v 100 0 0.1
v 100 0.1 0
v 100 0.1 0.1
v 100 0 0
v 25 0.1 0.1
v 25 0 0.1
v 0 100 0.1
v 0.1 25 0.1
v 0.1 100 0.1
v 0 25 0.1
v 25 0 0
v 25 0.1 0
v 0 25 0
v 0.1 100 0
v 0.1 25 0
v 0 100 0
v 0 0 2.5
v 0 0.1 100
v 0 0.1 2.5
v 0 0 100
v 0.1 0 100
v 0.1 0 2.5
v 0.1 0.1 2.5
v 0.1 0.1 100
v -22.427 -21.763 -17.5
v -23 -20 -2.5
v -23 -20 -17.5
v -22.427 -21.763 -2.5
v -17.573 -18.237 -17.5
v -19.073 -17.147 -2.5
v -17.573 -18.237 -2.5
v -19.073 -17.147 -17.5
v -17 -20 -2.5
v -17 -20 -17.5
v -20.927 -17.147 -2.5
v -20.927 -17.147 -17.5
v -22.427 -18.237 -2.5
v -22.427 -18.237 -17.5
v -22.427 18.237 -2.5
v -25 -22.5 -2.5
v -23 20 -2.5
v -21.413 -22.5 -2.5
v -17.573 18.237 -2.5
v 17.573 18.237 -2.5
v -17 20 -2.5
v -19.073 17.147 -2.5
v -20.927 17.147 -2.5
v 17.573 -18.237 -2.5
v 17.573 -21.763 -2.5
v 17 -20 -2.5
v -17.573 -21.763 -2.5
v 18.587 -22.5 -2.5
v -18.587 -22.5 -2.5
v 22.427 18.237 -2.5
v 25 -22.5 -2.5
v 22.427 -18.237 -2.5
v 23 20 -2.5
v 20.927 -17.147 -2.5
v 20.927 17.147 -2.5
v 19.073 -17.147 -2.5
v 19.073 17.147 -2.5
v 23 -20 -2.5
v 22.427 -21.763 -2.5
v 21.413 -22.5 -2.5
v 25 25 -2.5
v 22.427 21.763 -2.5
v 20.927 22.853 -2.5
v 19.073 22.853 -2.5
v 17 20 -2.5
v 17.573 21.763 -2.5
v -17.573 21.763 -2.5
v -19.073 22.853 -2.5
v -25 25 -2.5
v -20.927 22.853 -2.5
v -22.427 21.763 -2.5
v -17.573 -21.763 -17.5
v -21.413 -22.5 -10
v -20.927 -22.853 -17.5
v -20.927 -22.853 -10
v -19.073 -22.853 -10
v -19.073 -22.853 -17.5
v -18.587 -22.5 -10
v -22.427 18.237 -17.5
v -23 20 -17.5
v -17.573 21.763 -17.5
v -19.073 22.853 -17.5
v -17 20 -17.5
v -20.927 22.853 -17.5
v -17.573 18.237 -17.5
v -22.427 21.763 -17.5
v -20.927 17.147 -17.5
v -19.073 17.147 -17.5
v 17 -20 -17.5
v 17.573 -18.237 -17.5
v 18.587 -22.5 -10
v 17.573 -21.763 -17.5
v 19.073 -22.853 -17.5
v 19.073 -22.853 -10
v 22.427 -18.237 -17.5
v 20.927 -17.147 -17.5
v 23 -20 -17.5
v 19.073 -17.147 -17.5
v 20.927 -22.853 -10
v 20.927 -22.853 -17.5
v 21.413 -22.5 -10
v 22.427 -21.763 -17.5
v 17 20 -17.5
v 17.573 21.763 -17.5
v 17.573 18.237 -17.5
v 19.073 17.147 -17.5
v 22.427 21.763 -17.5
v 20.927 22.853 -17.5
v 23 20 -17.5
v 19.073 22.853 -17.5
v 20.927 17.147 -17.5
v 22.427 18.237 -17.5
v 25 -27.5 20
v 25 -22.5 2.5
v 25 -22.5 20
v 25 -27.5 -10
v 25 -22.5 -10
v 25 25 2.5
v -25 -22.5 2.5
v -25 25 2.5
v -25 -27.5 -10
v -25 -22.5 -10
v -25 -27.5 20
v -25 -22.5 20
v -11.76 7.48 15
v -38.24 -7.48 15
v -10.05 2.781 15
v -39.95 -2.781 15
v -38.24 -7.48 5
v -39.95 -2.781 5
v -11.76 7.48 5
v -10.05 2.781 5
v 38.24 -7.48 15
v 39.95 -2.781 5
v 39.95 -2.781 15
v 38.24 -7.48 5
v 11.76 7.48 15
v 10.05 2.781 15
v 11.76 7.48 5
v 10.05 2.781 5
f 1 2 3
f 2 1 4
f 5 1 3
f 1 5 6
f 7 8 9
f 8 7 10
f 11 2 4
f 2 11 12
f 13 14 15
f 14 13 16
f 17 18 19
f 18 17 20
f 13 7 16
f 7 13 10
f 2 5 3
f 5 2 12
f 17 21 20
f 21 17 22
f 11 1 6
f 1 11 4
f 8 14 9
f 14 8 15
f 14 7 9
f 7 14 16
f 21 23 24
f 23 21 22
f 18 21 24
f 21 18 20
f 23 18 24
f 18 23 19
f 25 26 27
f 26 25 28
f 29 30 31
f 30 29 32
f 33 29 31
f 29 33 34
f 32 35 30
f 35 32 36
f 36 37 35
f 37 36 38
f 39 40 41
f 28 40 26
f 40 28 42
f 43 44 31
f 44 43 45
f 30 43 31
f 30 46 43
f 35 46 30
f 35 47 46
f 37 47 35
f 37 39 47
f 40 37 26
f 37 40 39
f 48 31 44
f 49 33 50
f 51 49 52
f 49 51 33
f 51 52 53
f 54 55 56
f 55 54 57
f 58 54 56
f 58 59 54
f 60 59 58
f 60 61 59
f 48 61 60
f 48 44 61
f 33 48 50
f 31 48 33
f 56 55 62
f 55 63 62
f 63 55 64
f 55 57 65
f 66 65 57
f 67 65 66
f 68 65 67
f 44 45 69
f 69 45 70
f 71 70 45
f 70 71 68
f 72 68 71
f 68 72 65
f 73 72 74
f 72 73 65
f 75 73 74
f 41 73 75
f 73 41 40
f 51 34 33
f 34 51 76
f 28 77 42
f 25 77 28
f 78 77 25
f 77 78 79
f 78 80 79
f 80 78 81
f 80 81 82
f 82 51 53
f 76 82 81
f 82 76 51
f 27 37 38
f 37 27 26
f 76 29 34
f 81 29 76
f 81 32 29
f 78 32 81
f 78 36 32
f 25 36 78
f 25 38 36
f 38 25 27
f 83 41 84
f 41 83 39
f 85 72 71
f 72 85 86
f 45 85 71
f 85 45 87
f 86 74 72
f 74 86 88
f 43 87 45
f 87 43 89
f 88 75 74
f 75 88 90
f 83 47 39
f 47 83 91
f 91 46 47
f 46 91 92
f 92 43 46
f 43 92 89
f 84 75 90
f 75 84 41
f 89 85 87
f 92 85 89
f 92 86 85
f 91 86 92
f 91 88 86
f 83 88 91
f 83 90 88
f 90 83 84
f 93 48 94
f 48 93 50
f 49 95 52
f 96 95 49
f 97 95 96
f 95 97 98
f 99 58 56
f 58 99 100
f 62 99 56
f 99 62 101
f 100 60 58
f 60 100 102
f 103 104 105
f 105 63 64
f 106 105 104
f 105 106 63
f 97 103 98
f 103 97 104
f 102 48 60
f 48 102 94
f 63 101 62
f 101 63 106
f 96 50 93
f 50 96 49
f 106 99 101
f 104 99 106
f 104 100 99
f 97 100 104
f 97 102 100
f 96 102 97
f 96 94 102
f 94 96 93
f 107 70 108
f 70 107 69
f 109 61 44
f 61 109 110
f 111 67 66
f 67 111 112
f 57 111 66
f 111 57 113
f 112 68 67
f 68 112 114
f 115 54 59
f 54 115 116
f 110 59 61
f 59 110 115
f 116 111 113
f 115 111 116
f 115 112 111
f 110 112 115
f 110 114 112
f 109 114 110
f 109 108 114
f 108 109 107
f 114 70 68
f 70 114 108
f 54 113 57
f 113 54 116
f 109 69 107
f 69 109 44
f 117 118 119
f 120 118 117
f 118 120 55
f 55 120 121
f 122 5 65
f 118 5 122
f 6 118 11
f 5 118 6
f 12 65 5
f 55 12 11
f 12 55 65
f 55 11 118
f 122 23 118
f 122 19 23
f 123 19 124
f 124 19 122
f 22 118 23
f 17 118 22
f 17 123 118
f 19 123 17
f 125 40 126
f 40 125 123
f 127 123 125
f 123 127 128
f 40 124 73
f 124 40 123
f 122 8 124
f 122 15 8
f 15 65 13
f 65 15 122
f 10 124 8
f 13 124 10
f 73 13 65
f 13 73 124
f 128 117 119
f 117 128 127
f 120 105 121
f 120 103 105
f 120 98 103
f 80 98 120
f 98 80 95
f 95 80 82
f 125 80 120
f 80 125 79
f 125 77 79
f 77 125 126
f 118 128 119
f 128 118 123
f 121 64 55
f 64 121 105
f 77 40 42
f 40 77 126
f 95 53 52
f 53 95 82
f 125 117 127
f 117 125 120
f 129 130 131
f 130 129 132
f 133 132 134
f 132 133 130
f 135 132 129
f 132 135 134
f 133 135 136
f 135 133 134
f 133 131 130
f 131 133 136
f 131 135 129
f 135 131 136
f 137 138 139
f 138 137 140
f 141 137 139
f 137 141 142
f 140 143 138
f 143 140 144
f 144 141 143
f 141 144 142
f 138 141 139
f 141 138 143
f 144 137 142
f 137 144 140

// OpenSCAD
    // Combined Scene

    // Permanent Model
    
    // Permanent Model (Black)
    color([0, 0, 0]) {
        // Your permanent model code here
        cube([100,0.1,0.1], center = false);
        cube([0.1,100,0.1], center = false);
        cube([0.1,0.1,100], center = false);
    }
    

    // Dynamic Model
    translate([0, 0, 0]) {
    // Chair Seat
    difference() {
        cube([50, 50, 5], center=true);
    }
    
    // Chair Backrest
    translate([0, -25, 5])
        cube([50, 5, 30], center=true);
    
    // Chair Armrests
    translate([-25, 0, 10])
        rotate([0, 0, 20])
        cube([30, 5, 10], center=true);
    translate([25, 0, 10])
        rotate([0, 0, -20])
        cube([30, 5, 10], center=true);
    
    // Chair Legs
    for (x = [-20, 20]) {
        for (y = [-20, 20]) {
            translate([x, y, -10])
                cylinder(r=3, h=15, center=true);
        }
    }
}
    
